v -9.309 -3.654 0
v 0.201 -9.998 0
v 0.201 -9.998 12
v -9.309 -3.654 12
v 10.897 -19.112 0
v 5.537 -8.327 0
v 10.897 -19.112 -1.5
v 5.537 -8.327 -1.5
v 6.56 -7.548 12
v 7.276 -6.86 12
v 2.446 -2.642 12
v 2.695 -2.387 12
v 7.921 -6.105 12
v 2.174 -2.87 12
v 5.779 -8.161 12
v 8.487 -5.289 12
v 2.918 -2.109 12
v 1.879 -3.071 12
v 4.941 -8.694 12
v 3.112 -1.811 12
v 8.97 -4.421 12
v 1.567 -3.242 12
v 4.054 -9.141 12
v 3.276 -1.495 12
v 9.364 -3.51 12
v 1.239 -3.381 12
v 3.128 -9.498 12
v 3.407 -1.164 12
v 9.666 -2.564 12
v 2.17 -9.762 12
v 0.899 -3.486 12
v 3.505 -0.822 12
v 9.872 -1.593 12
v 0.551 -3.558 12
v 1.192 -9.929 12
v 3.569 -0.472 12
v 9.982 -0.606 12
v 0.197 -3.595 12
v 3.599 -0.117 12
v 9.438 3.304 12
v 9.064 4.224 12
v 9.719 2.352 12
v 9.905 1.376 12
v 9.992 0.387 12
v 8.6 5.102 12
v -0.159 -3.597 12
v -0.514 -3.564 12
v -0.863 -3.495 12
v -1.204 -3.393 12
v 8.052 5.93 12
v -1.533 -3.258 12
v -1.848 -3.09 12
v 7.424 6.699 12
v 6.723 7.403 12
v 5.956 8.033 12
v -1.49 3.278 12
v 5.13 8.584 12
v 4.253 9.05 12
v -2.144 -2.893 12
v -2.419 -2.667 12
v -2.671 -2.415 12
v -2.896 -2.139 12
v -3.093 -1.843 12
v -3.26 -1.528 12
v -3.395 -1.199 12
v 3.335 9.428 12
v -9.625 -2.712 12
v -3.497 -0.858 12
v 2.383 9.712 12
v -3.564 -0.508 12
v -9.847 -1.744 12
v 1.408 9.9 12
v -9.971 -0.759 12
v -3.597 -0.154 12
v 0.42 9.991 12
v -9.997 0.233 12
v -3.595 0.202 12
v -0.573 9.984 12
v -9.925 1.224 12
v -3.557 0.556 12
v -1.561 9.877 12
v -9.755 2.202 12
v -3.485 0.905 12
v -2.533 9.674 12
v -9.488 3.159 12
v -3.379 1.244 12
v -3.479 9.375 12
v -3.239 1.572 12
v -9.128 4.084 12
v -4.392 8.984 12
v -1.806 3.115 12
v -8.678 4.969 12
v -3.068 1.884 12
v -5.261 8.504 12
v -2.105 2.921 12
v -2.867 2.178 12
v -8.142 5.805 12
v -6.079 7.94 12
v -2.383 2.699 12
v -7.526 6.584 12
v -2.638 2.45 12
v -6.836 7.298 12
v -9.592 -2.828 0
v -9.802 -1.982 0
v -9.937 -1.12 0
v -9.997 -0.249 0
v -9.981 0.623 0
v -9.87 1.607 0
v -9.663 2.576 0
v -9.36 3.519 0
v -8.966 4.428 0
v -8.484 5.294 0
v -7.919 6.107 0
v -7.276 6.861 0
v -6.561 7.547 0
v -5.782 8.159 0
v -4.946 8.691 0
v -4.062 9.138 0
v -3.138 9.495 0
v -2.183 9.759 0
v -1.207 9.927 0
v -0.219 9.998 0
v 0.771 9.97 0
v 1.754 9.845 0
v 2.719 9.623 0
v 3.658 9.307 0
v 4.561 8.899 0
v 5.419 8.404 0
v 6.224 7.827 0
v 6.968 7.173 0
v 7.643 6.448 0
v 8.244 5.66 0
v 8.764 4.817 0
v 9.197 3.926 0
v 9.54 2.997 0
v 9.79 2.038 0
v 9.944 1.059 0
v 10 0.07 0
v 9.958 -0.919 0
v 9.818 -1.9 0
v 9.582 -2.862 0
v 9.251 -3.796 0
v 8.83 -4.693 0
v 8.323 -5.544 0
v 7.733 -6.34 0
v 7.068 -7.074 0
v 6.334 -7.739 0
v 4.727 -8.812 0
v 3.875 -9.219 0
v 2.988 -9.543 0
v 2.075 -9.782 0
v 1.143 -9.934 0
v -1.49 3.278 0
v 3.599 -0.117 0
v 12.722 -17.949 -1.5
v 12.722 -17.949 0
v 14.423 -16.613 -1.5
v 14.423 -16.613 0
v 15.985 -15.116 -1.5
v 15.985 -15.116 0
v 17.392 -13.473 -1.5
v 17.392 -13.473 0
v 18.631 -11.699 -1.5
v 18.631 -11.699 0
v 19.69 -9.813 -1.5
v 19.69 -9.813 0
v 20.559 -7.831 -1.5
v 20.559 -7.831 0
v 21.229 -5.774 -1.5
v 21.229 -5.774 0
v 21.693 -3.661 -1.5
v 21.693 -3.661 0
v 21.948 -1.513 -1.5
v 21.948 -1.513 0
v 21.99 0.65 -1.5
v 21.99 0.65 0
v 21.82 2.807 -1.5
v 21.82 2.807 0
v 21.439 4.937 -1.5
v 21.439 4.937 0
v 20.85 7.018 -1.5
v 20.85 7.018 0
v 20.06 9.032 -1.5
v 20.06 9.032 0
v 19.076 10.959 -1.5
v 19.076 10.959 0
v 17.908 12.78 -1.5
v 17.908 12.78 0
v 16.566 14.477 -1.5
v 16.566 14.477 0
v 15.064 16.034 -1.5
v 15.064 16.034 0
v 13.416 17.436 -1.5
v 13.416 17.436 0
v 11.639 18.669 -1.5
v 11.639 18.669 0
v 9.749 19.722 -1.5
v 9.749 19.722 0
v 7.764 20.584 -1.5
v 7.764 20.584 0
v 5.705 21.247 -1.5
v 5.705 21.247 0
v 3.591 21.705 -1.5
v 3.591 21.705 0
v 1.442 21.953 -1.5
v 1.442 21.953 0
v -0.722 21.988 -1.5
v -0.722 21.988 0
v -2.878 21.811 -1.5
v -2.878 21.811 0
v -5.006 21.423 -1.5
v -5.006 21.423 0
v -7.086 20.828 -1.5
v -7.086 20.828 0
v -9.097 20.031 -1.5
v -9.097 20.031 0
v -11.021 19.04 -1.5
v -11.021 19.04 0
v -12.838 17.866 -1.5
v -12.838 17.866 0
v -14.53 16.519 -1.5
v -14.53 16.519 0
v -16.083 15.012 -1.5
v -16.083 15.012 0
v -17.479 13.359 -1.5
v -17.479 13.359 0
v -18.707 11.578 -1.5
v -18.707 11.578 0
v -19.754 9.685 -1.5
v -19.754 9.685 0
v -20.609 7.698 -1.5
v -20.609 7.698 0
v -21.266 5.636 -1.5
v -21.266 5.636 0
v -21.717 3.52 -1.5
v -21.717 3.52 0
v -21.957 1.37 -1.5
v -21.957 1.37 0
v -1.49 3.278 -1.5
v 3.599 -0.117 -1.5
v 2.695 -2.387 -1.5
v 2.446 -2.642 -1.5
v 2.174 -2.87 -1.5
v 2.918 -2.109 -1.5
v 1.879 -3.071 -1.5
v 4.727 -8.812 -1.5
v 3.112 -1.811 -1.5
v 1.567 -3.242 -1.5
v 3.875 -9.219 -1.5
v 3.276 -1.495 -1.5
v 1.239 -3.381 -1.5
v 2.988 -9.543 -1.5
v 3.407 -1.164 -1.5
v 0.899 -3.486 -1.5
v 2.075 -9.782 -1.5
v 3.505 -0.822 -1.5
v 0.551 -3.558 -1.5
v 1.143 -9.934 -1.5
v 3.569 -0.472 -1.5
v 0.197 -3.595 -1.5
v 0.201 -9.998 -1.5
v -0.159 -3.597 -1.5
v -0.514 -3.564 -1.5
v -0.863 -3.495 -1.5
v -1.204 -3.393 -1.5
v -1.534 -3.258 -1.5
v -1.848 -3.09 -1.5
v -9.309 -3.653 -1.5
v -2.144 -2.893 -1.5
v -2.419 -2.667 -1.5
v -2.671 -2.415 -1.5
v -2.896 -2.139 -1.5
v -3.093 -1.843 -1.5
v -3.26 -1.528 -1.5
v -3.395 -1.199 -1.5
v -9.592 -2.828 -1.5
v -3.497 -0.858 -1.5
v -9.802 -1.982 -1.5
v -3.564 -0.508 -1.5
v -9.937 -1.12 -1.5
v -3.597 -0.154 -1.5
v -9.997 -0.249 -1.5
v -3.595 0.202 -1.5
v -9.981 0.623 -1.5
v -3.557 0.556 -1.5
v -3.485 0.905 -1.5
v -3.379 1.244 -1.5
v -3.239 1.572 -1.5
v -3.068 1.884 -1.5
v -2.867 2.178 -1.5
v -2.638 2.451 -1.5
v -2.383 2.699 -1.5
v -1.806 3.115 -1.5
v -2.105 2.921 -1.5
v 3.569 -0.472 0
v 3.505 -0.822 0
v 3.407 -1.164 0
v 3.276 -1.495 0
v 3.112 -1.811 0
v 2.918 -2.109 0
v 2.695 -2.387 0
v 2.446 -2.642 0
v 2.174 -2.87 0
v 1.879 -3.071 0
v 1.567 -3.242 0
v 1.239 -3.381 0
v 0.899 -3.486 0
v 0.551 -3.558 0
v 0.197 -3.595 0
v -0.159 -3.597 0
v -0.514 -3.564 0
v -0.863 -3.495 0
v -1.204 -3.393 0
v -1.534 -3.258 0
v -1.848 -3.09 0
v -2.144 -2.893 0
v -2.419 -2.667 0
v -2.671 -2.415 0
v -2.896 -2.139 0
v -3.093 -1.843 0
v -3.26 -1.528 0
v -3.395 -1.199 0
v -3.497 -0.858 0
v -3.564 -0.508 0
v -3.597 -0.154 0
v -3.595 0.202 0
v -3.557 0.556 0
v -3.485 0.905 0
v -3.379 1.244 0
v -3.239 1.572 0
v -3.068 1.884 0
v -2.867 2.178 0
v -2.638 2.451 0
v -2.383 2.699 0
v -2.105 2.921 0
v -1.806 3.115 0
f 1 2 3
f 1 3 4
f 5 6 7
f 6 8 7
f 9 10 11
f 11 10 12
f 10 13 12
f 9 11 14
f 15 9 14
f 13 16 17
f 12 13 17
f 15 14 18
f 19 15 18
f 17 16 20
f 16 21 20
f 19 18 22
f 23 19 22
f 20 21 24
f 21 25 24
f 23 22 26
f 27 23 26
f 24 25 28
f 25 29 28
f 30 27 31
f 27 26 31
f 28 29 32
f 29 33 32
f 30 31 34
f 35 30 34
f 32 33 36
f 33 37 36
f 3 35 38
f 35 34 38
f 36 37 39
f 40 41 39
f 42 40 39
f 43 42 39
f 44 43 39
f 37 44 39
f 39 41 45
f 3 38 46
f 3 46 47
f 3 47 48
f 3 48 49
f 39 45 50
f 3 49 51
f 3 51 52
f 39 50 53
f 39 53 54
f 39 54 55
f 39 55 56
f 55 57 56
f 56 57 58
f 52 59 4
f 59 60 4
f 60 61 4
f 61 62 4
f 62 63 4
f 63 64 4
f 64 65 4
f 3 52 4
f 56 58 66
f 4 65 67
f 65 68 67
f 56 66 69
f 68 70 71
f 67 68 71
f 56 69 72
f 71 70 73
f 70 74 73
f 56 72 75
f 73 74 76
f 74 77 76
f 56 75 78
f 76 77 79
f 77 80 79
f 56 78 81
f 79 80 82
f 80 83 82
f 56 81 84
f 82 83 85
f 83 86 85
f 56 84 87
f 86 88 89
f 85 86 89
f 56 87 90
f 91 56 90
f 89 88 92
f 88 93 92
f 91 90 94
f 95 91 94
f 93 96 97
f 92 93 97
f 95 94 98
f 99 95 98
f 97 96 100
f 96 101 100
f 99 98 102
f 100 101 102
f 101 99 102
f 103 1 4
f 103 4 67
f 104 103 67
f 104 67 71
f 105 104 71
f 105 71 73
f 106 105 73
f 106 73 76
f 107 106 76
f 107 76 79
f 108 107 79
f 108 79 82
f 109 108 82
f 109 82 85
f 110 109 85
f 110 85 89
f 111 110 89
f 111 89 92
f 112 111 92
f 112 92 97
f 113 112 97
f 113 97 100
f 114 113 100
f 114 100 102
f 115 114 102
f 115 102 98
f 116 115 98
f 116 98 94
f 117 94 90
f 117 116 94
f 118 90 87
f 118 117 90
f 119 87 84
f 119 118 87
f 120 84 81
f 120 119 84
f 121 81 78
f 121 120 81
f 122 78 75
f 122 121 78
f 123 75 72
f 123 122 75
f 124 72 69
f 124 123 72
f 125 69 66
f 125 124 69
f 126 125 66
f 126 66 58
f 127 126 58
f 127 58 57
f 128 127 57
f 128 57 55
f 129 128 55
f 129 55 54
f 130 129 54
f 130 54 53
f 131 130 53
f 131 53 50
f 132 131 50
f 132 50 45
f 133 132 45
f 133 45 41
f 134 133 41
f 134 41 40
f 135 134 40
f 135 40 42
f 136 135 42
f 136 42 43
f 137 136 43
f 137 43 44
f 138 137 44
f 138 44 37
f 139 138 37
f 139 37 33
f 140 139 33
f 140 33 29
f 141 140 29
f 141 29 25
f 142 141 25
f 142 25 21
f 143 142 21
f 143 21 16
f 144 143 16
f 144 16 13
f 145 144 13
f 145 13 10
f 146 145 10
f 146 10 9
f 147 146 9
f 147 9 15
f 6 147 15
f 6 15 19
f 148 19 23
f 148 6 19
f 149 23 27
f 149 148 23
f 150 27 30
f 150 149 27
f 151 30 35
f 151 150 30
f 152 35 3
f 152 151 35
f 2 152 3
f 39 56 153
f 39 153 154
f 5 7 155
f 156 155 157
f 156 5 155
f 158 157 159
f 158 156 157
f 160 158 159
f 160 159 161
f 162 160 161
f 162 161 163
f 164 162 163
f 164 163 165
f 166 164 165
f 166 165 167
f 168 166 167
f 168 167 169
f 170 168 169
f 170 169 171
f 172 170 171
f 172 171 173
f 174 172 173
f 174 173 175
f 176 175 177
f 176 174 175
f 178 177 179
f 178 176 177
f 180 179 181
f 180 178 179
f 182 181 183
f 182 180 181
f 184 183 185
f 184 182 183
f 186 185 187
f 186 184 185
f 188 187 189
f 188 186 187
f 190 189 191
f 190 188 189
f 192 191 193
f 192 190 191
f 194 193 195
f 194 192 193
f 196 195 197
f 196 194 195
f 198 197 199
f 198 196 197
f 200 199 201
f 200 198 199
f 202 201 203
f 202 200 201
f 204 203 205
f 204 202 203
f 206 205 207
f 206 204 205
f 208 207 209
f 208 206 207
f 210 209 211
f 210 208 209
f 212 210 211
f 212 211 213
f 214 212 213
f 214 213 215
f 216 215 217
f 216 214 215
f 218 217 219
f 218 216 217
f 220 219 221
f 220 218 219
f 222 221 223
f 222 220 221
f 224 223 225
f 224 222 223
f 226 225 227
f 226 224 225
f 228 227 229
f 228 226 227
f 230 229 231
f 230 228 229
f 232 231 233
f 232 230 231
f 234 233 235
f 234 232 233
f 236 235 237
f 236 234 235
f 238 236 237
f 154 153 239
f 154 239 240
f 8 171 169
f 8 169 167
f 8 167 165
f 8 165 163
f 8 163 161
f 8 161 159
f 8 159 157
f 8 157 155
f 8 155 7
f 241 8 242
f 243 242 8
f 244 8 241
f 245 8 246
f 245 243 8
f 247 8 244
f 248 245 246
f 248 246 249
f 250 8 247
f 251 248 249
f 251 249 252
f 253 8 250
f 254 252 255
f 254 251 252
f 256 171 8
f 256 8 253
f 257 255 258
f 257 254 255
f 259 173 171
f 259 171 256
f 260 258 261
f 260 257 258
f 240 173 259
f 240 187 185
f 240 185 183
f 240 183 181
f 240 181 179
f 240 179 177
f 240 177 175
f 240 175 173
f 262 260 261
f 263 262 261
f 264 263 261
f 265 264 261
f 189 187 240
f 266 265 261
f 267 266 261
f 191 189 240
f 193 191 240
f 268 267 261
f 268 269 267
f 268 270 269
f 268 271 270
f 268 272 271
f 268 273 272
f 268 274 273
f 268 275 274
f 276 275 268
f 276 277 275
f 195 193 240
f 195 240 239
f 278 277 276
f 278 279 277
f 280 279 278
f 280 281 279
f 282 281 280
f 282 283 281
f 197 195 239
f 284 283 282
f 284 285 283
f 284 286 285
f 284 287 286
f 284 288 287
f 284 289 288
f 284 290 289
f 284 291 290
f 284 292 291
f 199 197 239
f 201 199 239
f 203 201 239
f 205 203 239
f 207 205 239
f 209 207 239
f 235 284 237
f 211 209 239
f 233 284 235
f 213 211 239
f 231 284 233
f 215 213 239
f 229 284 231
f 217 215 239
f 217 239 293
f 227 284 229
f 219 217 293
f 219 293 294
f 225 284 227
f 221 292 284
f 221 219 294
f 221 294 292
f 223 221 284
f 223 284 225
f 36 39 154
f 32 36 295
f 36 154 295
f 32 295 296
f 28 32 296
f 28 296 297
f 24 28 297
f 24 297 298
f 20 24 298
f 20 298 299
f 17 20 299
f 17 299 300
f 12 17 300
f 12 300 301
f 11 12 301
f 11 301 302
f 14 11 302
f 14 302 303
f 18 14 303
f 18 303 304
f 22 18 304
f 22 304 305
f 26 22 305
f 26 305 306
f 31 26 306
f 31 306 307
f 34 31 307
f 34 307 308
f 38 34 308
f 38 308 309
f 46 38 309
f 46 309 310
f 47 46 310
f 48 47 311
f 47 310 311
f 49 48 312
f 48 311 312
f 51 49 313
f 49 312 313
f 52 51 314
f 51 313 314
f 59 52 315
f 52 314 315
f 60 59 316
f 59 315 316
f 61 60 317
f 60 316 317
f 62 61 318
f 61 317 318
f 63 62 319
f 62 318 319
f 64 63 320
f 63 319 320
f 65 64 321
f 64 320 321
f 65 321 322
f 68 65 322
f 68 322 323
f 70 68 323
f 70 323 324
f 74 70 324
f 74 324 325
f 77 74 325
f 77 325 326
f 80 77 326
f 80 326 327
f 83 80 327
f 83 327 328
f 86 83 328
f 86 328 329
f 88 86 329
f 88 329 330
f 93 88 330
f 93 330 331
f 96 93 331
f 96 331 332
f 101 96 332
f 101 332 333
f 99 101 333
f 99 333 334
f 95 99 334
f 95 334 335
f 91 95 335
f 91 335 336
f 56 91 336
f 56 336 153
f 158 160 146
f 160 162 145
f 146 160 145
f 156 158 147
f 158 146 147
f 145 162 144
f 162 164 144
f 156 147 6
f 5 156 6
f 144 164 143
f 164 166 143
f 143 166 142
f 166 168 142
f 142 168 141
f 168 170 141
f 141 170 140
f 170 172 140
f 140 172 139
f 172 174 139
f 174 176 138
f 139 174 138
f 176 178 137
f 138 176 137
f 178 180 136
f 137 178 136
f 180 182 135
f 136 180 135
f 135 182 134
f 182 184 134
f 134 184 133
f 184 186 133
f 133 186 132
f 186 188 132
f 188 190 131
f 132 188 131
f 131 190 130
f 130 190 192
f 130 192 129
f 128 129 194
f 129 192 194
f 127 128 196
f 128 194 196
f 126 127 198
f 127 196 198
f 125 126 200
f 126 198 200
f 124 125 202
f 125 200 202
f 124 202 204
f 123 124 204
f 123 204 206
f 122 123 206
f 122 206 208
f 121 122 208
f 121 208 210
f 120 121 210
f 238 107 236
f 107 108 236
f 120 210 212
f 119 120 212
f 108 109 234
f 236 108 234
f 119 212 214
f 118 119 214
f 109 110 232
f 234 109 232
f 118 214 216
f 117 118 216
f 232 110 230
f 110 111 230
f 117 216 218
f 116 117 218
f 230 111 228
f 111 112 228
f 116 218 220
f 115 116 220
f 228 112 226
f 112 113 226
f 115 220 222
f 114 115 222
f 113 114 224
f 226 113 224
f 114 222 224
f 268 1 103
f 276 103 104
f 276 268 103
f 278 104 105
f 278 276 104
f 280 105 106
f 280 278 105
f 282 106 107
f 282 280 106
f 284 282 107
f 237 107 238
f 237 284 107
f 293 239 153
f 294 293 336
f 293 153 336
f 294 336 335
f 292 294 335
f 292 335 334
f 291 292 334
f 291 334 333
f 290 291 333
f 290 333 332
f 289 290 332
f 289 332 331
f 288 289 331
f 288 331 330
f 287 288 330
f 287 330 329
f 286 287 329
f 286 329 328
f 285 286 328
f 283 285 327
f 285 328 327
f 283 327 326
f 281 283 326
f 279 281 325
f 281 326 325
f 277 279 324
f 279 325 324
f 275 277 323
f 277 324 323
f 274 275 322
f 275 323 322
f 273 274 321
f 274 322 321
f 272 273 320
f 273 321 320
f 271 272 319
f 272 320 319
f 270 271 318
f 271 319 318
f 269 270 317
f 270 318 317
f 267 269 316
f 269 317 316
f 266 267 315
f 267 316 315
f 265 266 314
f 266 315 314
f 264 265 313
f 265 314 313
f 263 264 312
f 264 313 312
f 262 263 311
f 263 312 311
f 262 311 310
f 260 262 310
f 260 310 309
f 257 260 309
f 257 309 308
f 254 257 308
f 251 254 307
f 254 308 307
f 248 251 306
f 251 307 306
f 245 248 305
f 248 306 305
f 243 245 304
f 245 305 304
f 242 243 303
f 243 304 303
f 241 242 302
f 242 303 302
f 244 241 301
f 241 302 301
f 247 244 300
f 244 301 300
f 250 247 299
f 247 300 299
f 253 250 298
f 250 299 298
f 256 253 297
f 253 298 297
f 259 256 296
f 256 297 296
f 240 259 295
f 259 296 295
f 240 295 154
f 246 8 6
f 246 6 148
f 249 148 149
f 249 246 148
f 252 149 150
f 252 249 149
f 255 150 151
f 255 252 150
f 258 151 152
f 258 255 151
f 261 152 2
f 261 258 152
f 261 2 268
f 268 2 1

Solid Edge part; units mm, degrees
sketch "Sketch1" plane through (0, 0, 0) normal (0, 0, 1) x (1, 0, 0)
  line L0 (0.2011, -9.998) -> (-9.3087, -3.6535)
  arc A0 (-9.3087, -3.6535) -> (0.2011, -9.998) centre (0, 0) cw
  line L1 (-1.4897, 3.2779) -> (3.5986, -0.1168)
  arc A1 (3.5986, -0.1168) -> (-1.4897, 3.2779) centre (0, 0) cw
extrude "Protrusion1" add sketch "Sketch1" along normal blind 12
sketch "Sketch2" plane through (-0.8973, 0, 0) normal (0, 0, -1) x (0, -1, 0)
  line L0 (9.998, -1.0984) -> (3.6535, 8.4114)
  line L1 (3.6535, 8.4114) -> (8.0376, 19.5818)
  line L2 (9.998, -1.0984) -> (21.9956, -1.3398)
  arc A0 (8.0376, 19.5818) -> (21.9956, -1.3398) centre (0, -0.8973) ccw
  arc A1 (0.1168, -4.4959) -> (-3.2779, 0.5923) centre (0, -0.8973) ccw
  line L3 (-3.2779, 0.5923) -> (0.1168, -4.4959)
extrude "ExtrudedProtrusion_2" add sketch "Sketch2" along normal blind 1.5
sketch "Sketch3" plane through (0, 0.0022, -1.5) normal (0, 0, -1) x (0.0201117, -0.9997977, 0)
  arc A0 (8.4391, -5.3682) -> (10.0022, 0) centre (0.0022, 0) ccw
  line L0 (10.0022, 0) -> (3.4677, 9.3804)
  arc A1 (3.4677, 9.3804) -> (-0.8212, 9.9661) centre (0.0022, 0) ccw
  line L1 (-0.8212, 9.9661) -> (-1.8094, 21.9253)
  arc A2 (-1.8094, 21.9253) -> (19.3291, -10.5105) centre (0.0022, 0) cw
  line L2 (8.4391, -5.3682) -> (19.3291, -10.5105)
extrude "ExtrudedCutout_1" cut sketch "Sketch3" against normal blind 22.4982
